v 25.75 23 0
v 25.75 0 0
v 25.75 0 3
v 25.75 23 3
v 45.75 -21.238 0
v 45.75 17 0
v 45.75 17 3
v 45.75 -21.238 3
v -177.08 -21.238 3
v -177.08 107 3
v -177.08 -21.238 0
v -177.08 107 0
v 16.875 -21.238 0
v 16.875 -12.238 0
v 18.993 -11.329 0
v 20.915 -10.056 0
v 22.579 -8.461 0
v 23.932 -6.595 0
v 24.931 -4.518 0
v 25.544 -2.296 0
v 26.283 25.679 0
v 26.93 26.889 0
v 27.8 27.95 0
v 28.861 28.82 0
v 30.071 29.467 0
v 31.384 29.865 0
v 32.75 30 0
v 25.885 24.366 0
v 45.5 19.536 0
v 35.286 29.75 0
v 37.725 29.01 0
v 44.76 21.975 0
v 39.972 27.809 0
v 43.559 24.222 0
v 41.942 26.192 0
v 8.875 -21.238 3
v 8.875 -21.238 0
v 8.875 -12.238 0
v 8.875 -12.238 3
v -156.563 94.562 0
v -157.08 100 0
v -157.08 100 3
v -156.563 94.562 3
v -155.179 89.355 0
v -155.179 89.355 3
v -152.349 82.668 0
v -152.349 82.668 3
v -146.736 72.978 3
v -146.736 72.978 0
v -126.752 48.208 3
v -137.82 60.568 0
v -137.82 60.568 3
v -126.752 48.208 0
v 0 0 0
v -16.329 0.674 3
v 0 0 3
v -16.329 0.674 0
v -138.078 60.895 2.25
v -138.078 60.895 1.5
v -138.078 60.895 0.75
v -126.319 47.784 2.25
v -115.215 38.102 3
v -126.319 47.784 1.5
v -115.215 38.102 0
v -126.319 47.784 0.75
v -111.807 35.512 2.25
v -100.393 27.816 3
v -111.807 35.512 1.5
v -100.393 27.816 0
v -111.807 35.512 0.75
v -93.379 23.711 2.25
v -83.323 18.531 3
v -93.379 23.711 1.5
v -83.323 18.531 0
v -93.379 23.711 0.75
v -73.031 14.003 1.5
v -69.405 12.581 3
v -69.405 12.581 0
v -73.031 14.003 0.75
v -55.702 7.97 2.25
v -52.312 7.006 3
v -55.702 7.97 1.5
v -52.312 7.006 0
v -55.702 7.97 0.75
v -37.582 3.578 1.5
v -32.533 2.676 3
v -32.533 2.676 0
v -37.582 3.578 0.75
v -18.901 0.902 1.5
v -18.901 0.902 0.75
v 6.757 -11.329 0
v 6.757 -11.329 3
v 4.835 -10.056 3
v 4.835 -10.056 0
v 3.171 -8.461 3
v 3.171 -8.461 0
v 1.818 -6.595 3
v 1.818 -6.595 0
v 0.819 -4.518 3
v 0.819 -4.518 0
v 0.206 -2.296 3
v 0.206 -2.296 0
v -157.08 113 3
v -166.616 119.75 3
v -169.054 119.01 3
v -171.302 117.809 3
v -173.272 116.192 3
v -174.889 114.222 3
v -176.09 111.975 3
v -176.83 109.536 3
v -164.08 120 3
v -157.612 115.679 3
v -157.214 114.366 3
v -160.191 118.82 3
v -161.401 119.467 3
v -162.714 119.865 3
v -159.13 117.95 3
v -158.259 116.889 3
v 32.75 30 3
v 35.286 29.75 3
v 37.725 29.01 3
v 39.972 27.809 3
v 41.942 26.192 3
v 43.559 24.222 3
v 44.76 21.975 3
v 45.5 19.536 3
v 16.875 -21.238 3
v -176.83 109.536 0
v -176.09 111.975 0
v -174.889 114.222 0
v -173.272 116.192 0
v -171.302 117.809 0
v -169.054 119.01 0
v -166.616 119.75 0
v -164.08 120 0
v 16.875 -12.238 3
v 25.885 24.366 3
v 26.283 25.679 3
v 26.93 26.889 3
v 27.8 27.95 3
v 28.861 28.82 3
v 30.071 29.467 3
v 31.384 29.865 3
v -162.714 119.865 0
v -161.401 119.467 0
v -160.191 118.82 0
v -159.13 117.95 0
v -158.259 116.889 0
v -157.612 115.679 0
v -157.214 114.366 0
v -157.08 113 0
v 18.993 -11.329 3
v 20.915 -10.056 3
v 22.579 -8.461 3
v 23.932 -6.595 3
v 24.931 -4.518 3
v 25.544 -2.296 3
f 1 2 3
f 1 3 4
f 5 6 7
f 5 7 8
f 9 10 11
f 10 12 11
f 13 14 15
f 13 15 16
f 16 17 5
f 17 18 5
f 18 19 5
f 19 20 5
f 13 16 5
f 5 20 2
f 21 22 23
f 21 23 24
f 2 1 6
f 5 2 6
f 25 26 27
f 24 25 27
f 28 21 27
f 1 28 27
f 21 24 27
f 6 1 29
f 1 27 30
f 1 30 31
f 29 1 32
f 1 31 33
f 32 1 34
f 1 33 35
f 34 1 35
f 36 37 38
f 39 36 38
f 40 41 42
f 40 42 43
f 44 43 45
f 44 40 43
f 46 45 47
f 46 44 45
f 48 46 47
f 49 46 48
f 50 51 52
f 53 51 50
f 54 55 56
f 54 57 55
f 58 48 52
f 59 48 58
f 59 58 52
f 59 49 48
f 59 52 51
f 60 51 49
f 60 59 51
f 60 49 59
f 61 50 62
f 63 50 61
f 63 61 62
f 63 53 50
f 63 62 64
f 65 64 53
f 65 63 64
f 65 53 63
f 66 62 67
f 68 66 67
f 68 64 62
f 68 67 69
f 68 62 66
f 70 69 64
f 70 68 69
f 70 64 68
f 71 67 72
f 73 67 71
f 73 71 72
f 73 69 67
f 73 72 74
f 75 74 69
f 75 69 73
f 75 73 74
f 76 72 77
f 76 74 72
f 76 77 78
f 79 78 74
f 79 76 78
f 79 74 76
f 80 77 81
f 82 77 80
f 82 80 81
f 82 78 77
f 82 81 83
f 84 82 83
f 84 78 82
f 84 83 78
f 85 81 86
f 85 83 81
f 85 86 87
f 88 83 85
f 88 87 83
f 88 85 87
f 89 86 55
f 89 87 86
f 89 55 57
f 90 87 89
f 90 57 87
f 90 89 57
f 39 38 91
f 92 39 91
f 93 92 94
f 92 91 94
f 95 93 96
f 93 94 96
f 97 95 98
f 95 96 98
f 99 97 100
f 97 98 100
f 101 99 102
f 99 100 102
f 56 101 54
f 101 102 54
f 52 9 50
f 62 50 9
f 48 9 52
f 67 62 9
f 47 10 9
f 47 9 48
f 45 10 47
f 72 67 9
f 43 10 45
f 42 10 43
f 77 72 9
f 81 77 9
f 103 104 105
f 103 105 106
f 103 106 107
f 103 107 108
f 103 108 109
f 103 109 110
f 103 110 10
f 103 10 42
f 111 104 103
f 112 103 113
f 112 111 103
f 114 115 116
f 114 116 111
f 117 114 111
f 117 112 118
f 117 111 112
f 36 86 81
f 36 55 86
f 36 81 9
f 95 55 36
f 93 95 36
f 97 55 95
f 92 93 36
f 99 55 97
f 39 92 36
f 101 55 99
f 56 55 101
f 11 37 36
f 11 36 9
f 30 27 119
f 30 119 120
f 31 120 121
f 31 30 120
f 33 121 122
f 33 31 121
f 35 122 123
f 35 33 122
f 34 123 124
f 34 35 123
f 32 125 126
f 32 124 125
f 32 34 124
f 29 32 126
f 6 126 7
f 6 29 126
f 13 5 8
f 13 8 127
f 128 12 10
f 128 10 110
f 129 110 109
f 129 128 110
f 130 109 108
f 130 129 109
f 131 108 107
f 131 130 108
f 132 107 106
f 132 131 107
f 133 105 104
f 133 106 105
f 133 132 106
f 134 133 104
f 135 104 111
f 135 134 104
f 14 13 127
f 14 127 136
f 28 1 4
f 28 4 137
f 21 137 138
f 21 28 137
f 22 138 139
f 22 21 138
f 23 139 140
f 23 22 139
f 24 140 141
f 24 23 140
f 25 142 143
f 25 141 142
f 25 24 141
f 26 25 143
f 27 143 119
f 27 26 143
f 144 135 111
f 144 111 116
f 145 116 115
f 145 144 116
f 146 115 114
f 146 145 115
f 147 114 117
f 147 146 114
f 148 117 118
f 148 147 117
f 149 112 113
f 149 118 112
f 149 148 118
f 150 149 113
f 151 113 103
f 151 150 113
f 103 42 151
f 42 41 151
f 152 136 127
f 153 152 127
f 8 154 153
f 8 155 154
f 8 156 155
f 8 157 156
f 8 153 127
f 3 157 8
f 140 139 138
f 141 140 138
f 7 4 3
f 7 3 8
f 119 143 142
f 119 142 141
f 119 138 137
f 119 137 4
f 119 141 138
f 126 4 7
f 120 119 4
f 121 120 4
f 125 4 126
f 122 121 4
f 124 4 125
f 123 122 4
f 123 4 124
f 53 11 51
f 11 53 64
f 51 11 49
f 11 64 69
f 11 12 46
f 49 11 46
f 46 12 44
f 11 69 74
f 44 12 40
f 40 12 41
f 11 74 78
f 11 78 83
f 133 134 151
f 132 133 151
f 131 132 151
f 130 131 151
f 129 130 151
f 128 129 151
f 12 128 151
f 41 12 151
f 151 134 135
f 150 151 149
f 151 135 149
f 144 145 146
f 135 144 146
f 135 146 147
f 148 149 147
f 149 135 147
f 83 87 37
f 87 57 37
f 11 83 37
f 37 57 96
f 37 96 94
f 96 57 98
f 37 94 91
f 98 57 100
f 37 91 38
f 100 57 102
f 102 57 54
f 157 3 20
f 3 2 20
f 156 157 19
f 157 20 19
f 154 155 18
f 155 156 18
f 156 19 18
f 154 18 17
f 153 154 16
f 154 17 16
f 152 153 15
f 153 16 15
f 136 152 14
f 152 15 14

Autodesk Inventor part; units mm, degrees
ref_plane "YZ Plane" through (0, 0, 0) normal (1, 0, 0) x (0, 1, 0)
ref_plane "XZ Plane" through (0, 0, 0) normal (0, 1, 0) x (-1, 0, 0)
ref_plane "XY Plane" through (0, 0, 0) normal (0, 0, 1) x (1, 0, 0)
sketch "Sketch3" plane through (0, 0, 0) normal (0, 0, 1) x (1, 0, 0)
  circle A0 centre (368.0481, 50) radius 50 construction
  line L0 (368.0481, 0) -> (514.9541, 0) construction
  line L1 (368.0481, 50) -> (514.9541, 50) construction
  line L2 (368.0481, 100) -> (514.9541, 100) construction
  line L3 (368.0481, 50) -> (343.0481, 6.6987) construction
  line L4 (368.0481, 50) -> (324.7469, 25) construction
  line L5 (368.0481, 50) -> (324.7469, 75) construction
  line L6 (343.0481, 93.3013) -> (368.0481, 50) construction
  line L7 (393.0481, 93.3013) -> (368.0481, 50) construction
  line L8 (411.3494, 75) -> (368.0481, 50) construction
  line L9 (411.3494, 25) -> (368.0481, 50) construction
  line L10 (393.0481, 6.6987) -> (368.0481, 50) construction
  line L11 (368.0481, 0) -> (368.0481, 100) construction
  line L12 (418.0481, 50) -> (368.0481, 50) construction
  line L13 (341.8682, 0) -> (341.8682, 100) construction
  line L14 (315.6883, 0) -> (315.6883, 100) construction
  line L15 (289.5083, 0) -> (289.5083, 100) construction
  line L16 (263.3284, 0) -> (263.3284, 100) construction
  line L17 (237.1485, 0) -> (237.1485, 100) construction
  line L18 (210.9685, 0) -> (210.9685, 100) construction
  line L19 (184.7886, 0) -> (184.7886, 100) construction
  line L20 (158.6086, 0) -> (158.6086, 100) construction
  circle A1 centre (315.6883, 50) radius 50 construction
  circle A2 centre (341.8682, 50) radius 50 construction
  circle A3 centre (289.5083, 50) radius 50 construction
  circle A4 centre (263.3284, 50) radius 50 construction
  circle A5 centre (237.1485, 50) radius 50 construction
  circle A6 centre (210.9685, 50) radius 50 construction
  line L21 (393.0481, 6.6987) -> (514.9541, 6.6987) construction
  line L22 (411.3494, 25) -> (514.9541, 25) construction
  line L23 (411.3494, 75) -> (514.9541, 75) construction
  line L24 (411.3494, 75) -> (514.9541, 75) construction
  line L25 (393.0481, 93.3013) -> (514.9541, 93.3013) construction
  line L26 (358.9895, 75) -> (339.5083, 50) construction
  line L27 (339.5083, 50) -> (306.6297, 25) construction
  line L28 (306.6297, 25) -> (262.1485, 6.6987) construction
  line L29 (262.1485, 6.6987) -> (210.9685, 0) construction
  line L30 (105.4843, -12.0642) -> (105.4843, 125.3083) construction
  line L31 (25.75, 0) -> (25.75, 23)
  line L32 (45.75, 17) -> (45.75, -21.2379)
  arc A7 (32.75, 30) -> (25.75, 23) centre (32.75, 23) ccw
  arc A8 (45.75, 17) -> (32.75, 30) centre (32.75, 17) ccw
  line L33 (32.75, 17) -> (45.75, 17) construction
  line L34 (32.75, 17) -> (32.75, 30) construction
  arc A9 (0, 0) -> (8.875, -12.2379) centre (12.875, 0) ccw
  arc A10 (16.875, -12.2379) -> (25.75, 0) centre (12.875, 0) ccw
  line L35 (45.75, -21.2379) -> (16.875, -21.2379)
  line L36 (8.875, -21.2379) -> (-177.0796, -21.2379)
  circle A11 centre (-144.2046, 110.3653) radius 12.875 construction
  line L37 (8.875, -21.2379) -> (8.875, -12.2379)
  line L38 (16.875, -21.2379) -> (16.875, -12.2379)
  line L39 (411.3494, 75) -> (158.6086, 75) construction
  line L40 (368.0481, 100) -> (158.6086, 100) construction
  line L41 (418.0481, 50) -> (158.6086, 50) construction
  line L42 (411.3494, 25) -> (158.6086, 25) construction
  line L43 (393.0481, 6.6987) -> (158.6086, 6.6987) construction
  line L44 (393.0481, 93.3013) -> (158.6086, 93.3013) construction
  line L45 (358.9895, 75) -> (366.8682, 93.3013) construction
  line L46 (366.8682, 93.3013) -> (368.0481, 100) construction
  spline S0 degree 4 poles (-157.0796, 100) (-157.0796, 88.9946) (-147.011, 72.6811) (-131.8577, 48.7932) (-88.4777, 17.6268) (-50.0176, 3.937) (-18.8717, 0) (0, 0) knots 0 0 0 0 0 0.264547 0.457223 0.66608 1 1 1 1 1
  line L47 (-157.0796, 100) -> (-157.0796, 81.2146) construction
  line L48 (0, 0) -> (-42.8818, 0) construction
  line L49 (-157.0796, 100) -> (-157.0796, 113)
  line L50 (-144.2046, 110.3653) -> (-157.0796, 110.3653) construction
  line L51 (-147.6984, 94.0277) -> (-120.1158, 108.3975) construction
  line L52 (-157.0796, 100) -> (0, 0) construction
  circle A12 centre (-147.2046, 105.4197) radius 9.875 construction
  line L53 (-147.2046, 105.4197) -> (-157.0796, 105.4197) construction
  line L54 (-146.1623, 94.828) -> (-144.7762, 92.1674) construction
  line L55 (-144.7762, 92.1674) -> (-142.2689, 93.4736) construction
  line L56 (-177.0796, 107) -> (-177.0796, -21.2379)
  arc A13 (-157.0796, 113) -> (-164.0796, 120) centre (-164.0796, 113) ccw
  line L57 (-164.0796, 113) -> (-164.0796, 120) construction
  line L58 (-164.0796, 113) -> (-157.0796, 113) construction
  arc A14 (-164.0796, 120) -> (-177.0796, 107) centre (-164.0796, 107) ccw
  line L59 (-164.0796, 107) -> (-177.0796, 107) construction
  line L60 (-164.0796, 107) -> (-164.0796, 120) construction
  line L61 (-457.0796, 100) -> (-300, 0)
  line L62 (-757.0796, 100) -> (-757.0796, 76.4376)
  line L63 (-600, 0) -> (-652.3765, 0)
  spline S1 degree 4 poles (-757.0796, 76.4376) (-757.0796, 65.0585) (-753.7776, 47.1407) (-745.4013, 7.8331) (-693.0053, 2.4317) (-668.8587, 0) (-652.3765, 0) knots 0 0 0 0 0 0.348765 0.598765 1 1 1 1 1
  line L64 (-477.0796, 107) -> (-477.0796, -21.2379)
  arc A15 (-464.0796, 120) -> (-477.0796, 107) centre (-464.0796, 107) ccw
  arc A16 (-457.0796, 113) -> (-464.0796, 120) centre (-464.0796, 113) ccw
  line L65 (-457.0796, 100) -> (-457.0796, 113)
  circle A17 centre (-447.2046, 105.4197) radius 9.875 construction
  circle A18 centre (-444.2046, 110.3653) radius 12.875 construction
  line L66 (-457.0796, 100) -> (-300, 0) construction
  line L67 (-447.6984, 94.0277) -> (-420.1158, 108.3975) construction
  line L68 (-444.7762, 92.1674) -> (-442.2689, 93.4736) construction
  line L69 (-446.1623, 94.828) -> (-444.7762, 92.1674) construction
  line L70 (-291.125, -21.2379) -> (-477.0796, -21.2379)
  arc A19 (-300, 0) -> (-291.125, -12.2379) centre (-287.125, 0) ccw
  line L71 (-291.125, -21.2379) -> (-291.125, -12.2379)
  line L72 (-283.125, -21.2379) -> (-283.125, -12.2379)
  arc A20 (-283.125, -12.2379) -> (-274.25, 0) centre (-287.125, 0) ccw
  line L73 (-254.25, -21.2379) -> (-283.125, -21.2379)
  line L74 (-254.25, 17) -> (-254.25, -21.2379)
  line L75 (-274.25, 0) -> (-274.25, 23)
  arc A21 (-267.25, 30) -> (-274.25, 23) centre (-267.25, 23) ccw
  arc A22 (-254.25, 17) -> (-267.25, 30) centre (-267.25, 17) ccw
  line L76 (-777.0796, 107) -> (-777.0796, -21.2379)
  arc A23 (-764.0796, 120) -> (-777.0796, 107) centre (-764.0796, 107) ccw
  arc A24 (-757.0796, 113) -> (-764.0796, 120) centre (-764.0796, 113) ccw
  line L77 (-757.0796, 100) -> (-757.0796, 113)
  circle A25 centre (-747.2046, 105.4197) radius 9.875 construction
  circle A26 centre (-744.2046, 110.3653) radius 12.875 construction
  line L78 (-757.0796, 100) -> (-600, 0) construction
  line L79 (-747.6984, 94.0277) -> (-720.1158, 108.3975) construction
  line L80 (-744.7762, 92.1674) -> (-742.2689, 93.4736) construction
  line L81 (-746.1623, 94.828) -> (-744.7762, 92.1674) construction
  line L82 (-591.125, -21.2379) -> (-777.0796, -21.2379)
  arc A27 (-600, 0) -> (-591.125, -12.2379) centre (-587.125, 0) ccw
  line L83 (-591.125, -21.2379) -> (-591.125, -12.2379)
  line L84 (-583.125, -21.2379) -> (-583.125, -12.2379)
  arc A28 (-583.125, -12.2379) -> (-574.25, 0) centre (-587.125, 0) ccw
  line L85 (-554.25, -21.2379) -> (-583.125, -21.2379)
  line L86 (-554.25, 17) -> (-554.25, -21.2379)
  line L87 (-574.25, 0) -> (-574.25, 23)
  arc A29 (-567.25, 30) -> (-574.25, 23) centre (-567.25, 23) ccw
  arc A30 (-554.25, 17) -> (-567.25, 30) centre (-567.25, 17) ccw
  line L88 (32.75, -233) -> (45.75, -233) construction
  line L89 (32.75, -233) -> (32.75, -220) construction
  arc A31 (45.75, -233) -> (32.75, -220) centre (32.75, -233) ccw construction
  line L90 (25.75, -250) -> (25.75, -227) construction
  line L91 (45.75, -233) -> (45.75, -271.2379) construction
  arc A32 (16.875, -262.2379) -> (25.75, -250) centre (12.875, -250) ccw construction
  line L92 (45.75, -271.2379) -> (16.875, -271.2379) construction
  arc A33 (0, -250) -> (8.875, -262.2379) centre (12.875, -250) ccw construction
  arc A34 (32.75, -220) -> (25.75, -227) centre (32.75, -227) ccw construction
  line L93 (8.875, -271.2379) -> (-177.0796, -271.2379) construction
  line L94 (-157.0796, -150) -> (0, -250) construction
  spline S2 degree 4 poles (-157.0796, -150) (-157.0796, -161.0054) (-147.011, -177.3189) (-131.8577, -201.2068) (-88.4777, -232.3732) (-50.0176, -246.063) (-18.8717, -250) (0, -250) knots 0 0 0 0 0 0.264547 0.457223 0.66608 1 1 1 1 1 construction
  line L95 (-177.0796, -143) -> (-177.0796, -271.2379)
  line L96 (-146.1623, -155.172) -> (-144.7762, -157.8326) construction
  line L97 (-144.7762, -157.8326) -> (-142.2689, -156.5264) construction
  line L98 (-147.6984, -155.9723) -> (-120.1158, -141.6025) construction
  line L99 (-157.0796, -150) -> (-157.0796, -168.7854) construction
  line L100 (-147.2046, -144.5803) -> (-157.0796, -144.5803) construction
  line L101 (-144.2046, -139.6347) -> (-157.0796, -139.6347) construction
  circle A35 centre (-147.2046, -144.5803) radius 9.875 construction
  line L102 (0, -250) -> (-42.8818, -250) construction
  line L103 (16.875, -271.2379) -> (16.875, -262.2379) construction
  line L104 (8.875, -271.2379) -> (8.875, -262.2379) construction
  circle A36 centre (-144.2046, -139.6347) radius 12.875 construction
  line L105 (-164.0796, -143) -> (-177.0796, -143) construction
  line L106 (-157.0796, -150) -> (-157.0796, -137) construction
  line L107 (-164.0796, -137) -> (-157.0796, -137) construction
  arc A37 (-157.0796, -137) -> (-164.0796, -130) centre (-164.0796, -137) ccw
  line L108 (-164.0796, -137) -> (-164.0796, -130) construction
  line L109 (-164.0796, -143) -> (-164.0796, -130) construction
  arc A38 (-164.0796, -130) -> (-177.0796, -143) centre (-164.0796, -143) ccw
  arc A39 (32.75, -227) -> (25.75, -234) centre (32.75, -234) ccw
  line L110 (32.75, -234) -> (25.75, -234) construction
  line L111 (32.75, -234) -> (32.75, -227) construction
  line L112 (45.75, -271.2379) -> (-177.0796, -271.2379)
  arc A40 (45.75, -240) -> (32.75, -227) centre (32.75, -240) ccw
  line L113 (32.75, -240) -> (45.75, -240) construction
  line L114 (32.75, -240) -> (32.75, -227) construction
  line L115 (45.75, -240) -> (45.75, -271.2379)
  line L116 (0, -242) -> (25.75, -242)
  line L117 (25.75, -234) -> (25.75, -242)
  line L118 (-149.0796, -145.6094) -> (-149.0796, -150)
  line L119 (-149.0796, -145.6094) -> (-157.0796, -140.5164)
  line L120 (-157.0796, -140.5164) -> (-157.0796, -137)
  line L121 (57.9242, -250) -> (-50.1018, -250) construction
  spline S3 degree 4 poles (-149.0796, -150) (-149.0796, -154.1011) (-147.2668, -159.7716) (-135.8793, -178.0796) (-120.229, -197.0865) (-83.3361, -225.9308) (-47.2959, -235.9761) (-18.0598, -242) (0, -242) knots 0 0 0 0 0 0.173174 0.31592 0.488873 0.682943 1 1 1 1 1
  line L122 (-158.9844, -148.7874) -> (-160.5796, -147.7718) construction
  line L123 (-149.0796, -145.6094) -> (2.3304, -242) construction
  line L124 (-149.0796, -145.6094) -> (-139.5059, -151.7042)
  line L125 (-146.1623, -155.172) -> (-139.5059, -151.7042)
  line L126 (-144.7762, -157.8326) -> (-146.1623, -155.172)
  line L127 (-144.7762, -157.8326) -> (-136.5837, -153.5646)
  line L128 (-136.5837, -153.5646) -> (-134.053, -155.1756)
  line L129 (-136.5837, -153.5646) -> (-136.7042, -153.7538) construction
  line L130 (-134.053, -155.1756) -> (-134.1481, -155.3251) construction
  spline S4 degree 4 poles (-134.053, -155.1756) (-136.4061, -157.5538) (-136.0923, -162.1212) (-140.7373, -169.888) (-137.1035, -175.12) knots 0 0 0 0 0 1 1 1 1 1
  line L131 (-134.053, -155.1756) -> (-131.4385, -154.0999) construction
  line L132 (-254.25, -271.2379) -> (-477.0796, -271.2379)
  line L133 (-477.0796, -143) -> (-477.0796, -271.2379)
  arc A41 (-464.0796, -130) -> (-477.0796, -143) centre (-464.0796, -143) ccw
  arc A42 (-457.0796, -137) -> (-464.0796, -130) centre (-464.0796, -137) ccw
  line L134 (-457.0796, -140.5164) -> (-457.0796, -137)
  line L135 (-449.0796, -145.6094) -> (-457.0796, -140.5164)
  line L136 (-449.0796, -145.6094) -> (-439.5059, -151.7042)
  line L137 (-446.1623, -155.172) -> (-439.5059, -151.7042)
  line L138 (-444.7762, -157.8326) -> (-446.1623, -155.172)
  line L139 (-444.7762, -157.8326) -> (-436.5837, -153.5646)
  line L140 (-436.5837, -153.5646) -> (-434.053, -155.1756)
  line L141 (-449.0796, -145.6094) -> (-297.6696, -242) construction
  line L142 (-300, -242) -> (-274.25, -242)
  line L143 (-274.25, -234) -> (-274.25, -242)
  arc A43 (-267.25, -227) -> (-274.25, -234) centre (-267.25, -234) ccw
  arc A44 (-254.25, -240) -> (-267.25, -227) centre (-267.25, -240) ccw
  line L144 (-254.25, -240) -> (-254.25, -271.2379)
  circle A45 centre (-447.2046, -144.5803) radius 9.875 construction
  line L145 (-457.0796, -150) -> (-300, -250) construction
  circle A46 centre (-444.2046, -139.6347) radius 12.875 construction
  line L146 (-554.25, -271.2379) -> (-777.0796, -271.2379)
  line L147 (-777.0796, -143) -> (-777.0796, -271.2379)
  arc A47 (-764.0796, -130) -> (-777.0796, -143) centre (-764.0796, -143) ccw
  arc A48 (-757.0796, -137) -> (-764.0796, -130) centre (-764.0796, -137) ccw
  line L148 (-757.0796, -140.5164) -> (-757.0796, -137)
  line L149 (-749.0796, -145.6094) -> (-757.0796, -140.5164)
  line L150 (-749.0796, -145.6094) -> (-739.5059, -151.7042)
  line L151 (-746.1623, -155.172) -> (-739.5059, -151.7042)
  line L152 (-744.7762, -157.8326) -> (-746.1623, -155.172)
  line L153 (-744.7762, -157.8326) -> (-736.5837, -153.5646)
  line L154 (-736.5837, -153.5646) -> (-734.053, -155.1756)
  line L155 (-749.0796, -145.6094) -> (-597.6696, -242) construction
  line L156 (-600, -242) -> (-574.25, -242)
  line L157 (-574.25, -234) -> (-574.25, -242)
  arc A49 (-567.25, -227) -> (-574.25, -234) centre (-567.25, -234) ccw
  arc A50 (-554.25, -240) -> (-567.25, -227) centre (-567.25, -240) ccw
  line L158 (-554.25, -240) -> (-554.25, -271.2379)
  circle A51 centre (-747.2046, -144.5803) radius 9.875 construction
  line L159 (-757.0796, -150) -> (-600, -250) construction
  circle A52 centre (-744.2046, -139.6347) radius 12.875 construction
  line L160 (-297.6696, -242) -> (-434.053, -155.1756)
  spline S5 degree 4 poles (-757.0796, -173.5624) (-757.0796, -184.9415) (-753.7776, -202.8593) (-745.4013, -242.1669) (-693.0053, -247.5683) (-668.8587, -250) (-652.3765, -250) knots 0 0 0 0 0 0.348765 0.598765 1 1 1 1 1 construction
  line L161 (-757.0796, -150) -> (-757.0796, -173.5624)
  line L162 (-600, -250) -> (-652.3765, -250) construction
  line L163 (-600, -242) -> (-652.3765, -242)
  spline S6 degree 4 poles (-749.0796, -173.5624) (-749.0796, -183.7991) (-746.0176, -199.7502) (-737.9559, -236.335) (-690.8375, -239.2991) (-667.8077, -242) (-652.3765, -242) knots 0 0 0 0 0 0.346383 0.596383 1 1 1 1 1
  line L164 (-749.0796, -173.5624) -> (-749.0796, -170.035) construction
  spline S7 degree 3 poles (-734.053, -155.1756) (-737.3528, -159.7401) (-749.7015, -168.8593) (-748.818, -180.0805) knots 0 0 0 0 1 1 1 1
  point P0 (158.6086, 0)
  point P1 (-148.021, 75)
  point P2 (-128.5398, 50)
  point P3 (-95.6611, 25)
  point P4 (-51.1799, 6.6987)
  point P5 (-155.8997, 93.3013)
  point P6 (-753.2027, 48.1984)
  point P7 (-737.7866, 19.9116)
  point P8 (-697.6619, 3.8098)
  point P9 (-457.0796, 110.3653)
  point P10 (-457.0796, 105.4197)
  point P11 (-757.0796, 110.3653)
  point P12 (-757.0796, 105.4197)
  point P13 (-51.1799, -243.3013)
  point P14 (-95.6611, -225)
  point P15 (-148.021, -175)
  point P16 (-128.5398, -200)
  point P17 (-155.8997, -156.6987)
  point P18 (-157.0796, -141.4334)
  point P19 (-153.0796, -143.0629)
  point P20 (-152.1421, -144.5803)
  point P21 (3.9112, -250)
  point P22 (-147.2046, -158.2164)
  point P23 (-137.7547, -174.1759)
  point P24 (-121.904, -193.5196)
  point P25 (-91.5665, -216.9339)
  point P26 (-48.8291, -234.4712)
  point P27 (-135.7724, -158.3311)
  point P28 (-137.8322, -165.6457)
  point P29 (-453.0796, -143.0629)
  point P30 (-457.0796, -144.5803)
  point P31 (-447.6984, -155.9723)
  point P32 (-457.0796, -139.6347)
  point P33 (-753.0796, -143.0629)
  point P34 (-757.0796, -144.5803)
  point P35 (-747.6984, -155.9723)
  point P36 (-757.0796, -139.6347)
  point P37 (-753.2027, -201.8016)
  point P38 (-737.7866, -230.0884)
  point P39 (-697.6619, -246.1902)
  point P40 (-745.4939, -198.9007)
  point P41 (-731.3987, -224.5882)
  point P42 (-695.3384, -238.4632)
  point P43 (-741.9736, -163.8801)
  dimension "d43" = 25.75
  dimension "d53" = 19.75
  dimension "diameter" = 100
  dimension "d8" = 26.1799
  dimension "d14" = 30
  dimension "d15" = 30
  dimension "d16" = 30
  dimension "d26" = 90
  dimension "stopper" = 30
  dimension "stopperthickness" = 20
  dimension "d32" = 12.875
  dimension "d33" = 12.875
  dimension "d38" = 6
  dimension "d47" = 8
  dimension "d49" = 9
  dimension "d55" = 120
  dimension "d56" = 3
  dimension "d57" = 90
  dimension "d58" = 90
  dimension "d59" = 20
  dimension "d60" = 6
  dimension "d61" = 20
  dimension "d62" = 28.875
  dimension "d72" = 300
  dimension "d93" = 250
  dimension "d98" = 90
  dimension "d99" = 44.2379
  dimension "d100" = 37.2379
  dimension "d101" = 90
  dimension "railheight" = 8
  dimension "d104" = 8
  dimension "d105" = 8
  dimension "d106" = 3
  dimension "d109" = 300
  dimension "d116" = 250
  dimension "d121" = 8
extrude "Extrusion1" add sketch "Sketch3" along normal blind 3 contours L31 A7 A8 L32 L35 L38 A10 | A9 L37 L36 L56 A14 A13 L49 S0
equation "\"d8\" = 0.261799 * diameter"
properties part number "cyloid-path"
